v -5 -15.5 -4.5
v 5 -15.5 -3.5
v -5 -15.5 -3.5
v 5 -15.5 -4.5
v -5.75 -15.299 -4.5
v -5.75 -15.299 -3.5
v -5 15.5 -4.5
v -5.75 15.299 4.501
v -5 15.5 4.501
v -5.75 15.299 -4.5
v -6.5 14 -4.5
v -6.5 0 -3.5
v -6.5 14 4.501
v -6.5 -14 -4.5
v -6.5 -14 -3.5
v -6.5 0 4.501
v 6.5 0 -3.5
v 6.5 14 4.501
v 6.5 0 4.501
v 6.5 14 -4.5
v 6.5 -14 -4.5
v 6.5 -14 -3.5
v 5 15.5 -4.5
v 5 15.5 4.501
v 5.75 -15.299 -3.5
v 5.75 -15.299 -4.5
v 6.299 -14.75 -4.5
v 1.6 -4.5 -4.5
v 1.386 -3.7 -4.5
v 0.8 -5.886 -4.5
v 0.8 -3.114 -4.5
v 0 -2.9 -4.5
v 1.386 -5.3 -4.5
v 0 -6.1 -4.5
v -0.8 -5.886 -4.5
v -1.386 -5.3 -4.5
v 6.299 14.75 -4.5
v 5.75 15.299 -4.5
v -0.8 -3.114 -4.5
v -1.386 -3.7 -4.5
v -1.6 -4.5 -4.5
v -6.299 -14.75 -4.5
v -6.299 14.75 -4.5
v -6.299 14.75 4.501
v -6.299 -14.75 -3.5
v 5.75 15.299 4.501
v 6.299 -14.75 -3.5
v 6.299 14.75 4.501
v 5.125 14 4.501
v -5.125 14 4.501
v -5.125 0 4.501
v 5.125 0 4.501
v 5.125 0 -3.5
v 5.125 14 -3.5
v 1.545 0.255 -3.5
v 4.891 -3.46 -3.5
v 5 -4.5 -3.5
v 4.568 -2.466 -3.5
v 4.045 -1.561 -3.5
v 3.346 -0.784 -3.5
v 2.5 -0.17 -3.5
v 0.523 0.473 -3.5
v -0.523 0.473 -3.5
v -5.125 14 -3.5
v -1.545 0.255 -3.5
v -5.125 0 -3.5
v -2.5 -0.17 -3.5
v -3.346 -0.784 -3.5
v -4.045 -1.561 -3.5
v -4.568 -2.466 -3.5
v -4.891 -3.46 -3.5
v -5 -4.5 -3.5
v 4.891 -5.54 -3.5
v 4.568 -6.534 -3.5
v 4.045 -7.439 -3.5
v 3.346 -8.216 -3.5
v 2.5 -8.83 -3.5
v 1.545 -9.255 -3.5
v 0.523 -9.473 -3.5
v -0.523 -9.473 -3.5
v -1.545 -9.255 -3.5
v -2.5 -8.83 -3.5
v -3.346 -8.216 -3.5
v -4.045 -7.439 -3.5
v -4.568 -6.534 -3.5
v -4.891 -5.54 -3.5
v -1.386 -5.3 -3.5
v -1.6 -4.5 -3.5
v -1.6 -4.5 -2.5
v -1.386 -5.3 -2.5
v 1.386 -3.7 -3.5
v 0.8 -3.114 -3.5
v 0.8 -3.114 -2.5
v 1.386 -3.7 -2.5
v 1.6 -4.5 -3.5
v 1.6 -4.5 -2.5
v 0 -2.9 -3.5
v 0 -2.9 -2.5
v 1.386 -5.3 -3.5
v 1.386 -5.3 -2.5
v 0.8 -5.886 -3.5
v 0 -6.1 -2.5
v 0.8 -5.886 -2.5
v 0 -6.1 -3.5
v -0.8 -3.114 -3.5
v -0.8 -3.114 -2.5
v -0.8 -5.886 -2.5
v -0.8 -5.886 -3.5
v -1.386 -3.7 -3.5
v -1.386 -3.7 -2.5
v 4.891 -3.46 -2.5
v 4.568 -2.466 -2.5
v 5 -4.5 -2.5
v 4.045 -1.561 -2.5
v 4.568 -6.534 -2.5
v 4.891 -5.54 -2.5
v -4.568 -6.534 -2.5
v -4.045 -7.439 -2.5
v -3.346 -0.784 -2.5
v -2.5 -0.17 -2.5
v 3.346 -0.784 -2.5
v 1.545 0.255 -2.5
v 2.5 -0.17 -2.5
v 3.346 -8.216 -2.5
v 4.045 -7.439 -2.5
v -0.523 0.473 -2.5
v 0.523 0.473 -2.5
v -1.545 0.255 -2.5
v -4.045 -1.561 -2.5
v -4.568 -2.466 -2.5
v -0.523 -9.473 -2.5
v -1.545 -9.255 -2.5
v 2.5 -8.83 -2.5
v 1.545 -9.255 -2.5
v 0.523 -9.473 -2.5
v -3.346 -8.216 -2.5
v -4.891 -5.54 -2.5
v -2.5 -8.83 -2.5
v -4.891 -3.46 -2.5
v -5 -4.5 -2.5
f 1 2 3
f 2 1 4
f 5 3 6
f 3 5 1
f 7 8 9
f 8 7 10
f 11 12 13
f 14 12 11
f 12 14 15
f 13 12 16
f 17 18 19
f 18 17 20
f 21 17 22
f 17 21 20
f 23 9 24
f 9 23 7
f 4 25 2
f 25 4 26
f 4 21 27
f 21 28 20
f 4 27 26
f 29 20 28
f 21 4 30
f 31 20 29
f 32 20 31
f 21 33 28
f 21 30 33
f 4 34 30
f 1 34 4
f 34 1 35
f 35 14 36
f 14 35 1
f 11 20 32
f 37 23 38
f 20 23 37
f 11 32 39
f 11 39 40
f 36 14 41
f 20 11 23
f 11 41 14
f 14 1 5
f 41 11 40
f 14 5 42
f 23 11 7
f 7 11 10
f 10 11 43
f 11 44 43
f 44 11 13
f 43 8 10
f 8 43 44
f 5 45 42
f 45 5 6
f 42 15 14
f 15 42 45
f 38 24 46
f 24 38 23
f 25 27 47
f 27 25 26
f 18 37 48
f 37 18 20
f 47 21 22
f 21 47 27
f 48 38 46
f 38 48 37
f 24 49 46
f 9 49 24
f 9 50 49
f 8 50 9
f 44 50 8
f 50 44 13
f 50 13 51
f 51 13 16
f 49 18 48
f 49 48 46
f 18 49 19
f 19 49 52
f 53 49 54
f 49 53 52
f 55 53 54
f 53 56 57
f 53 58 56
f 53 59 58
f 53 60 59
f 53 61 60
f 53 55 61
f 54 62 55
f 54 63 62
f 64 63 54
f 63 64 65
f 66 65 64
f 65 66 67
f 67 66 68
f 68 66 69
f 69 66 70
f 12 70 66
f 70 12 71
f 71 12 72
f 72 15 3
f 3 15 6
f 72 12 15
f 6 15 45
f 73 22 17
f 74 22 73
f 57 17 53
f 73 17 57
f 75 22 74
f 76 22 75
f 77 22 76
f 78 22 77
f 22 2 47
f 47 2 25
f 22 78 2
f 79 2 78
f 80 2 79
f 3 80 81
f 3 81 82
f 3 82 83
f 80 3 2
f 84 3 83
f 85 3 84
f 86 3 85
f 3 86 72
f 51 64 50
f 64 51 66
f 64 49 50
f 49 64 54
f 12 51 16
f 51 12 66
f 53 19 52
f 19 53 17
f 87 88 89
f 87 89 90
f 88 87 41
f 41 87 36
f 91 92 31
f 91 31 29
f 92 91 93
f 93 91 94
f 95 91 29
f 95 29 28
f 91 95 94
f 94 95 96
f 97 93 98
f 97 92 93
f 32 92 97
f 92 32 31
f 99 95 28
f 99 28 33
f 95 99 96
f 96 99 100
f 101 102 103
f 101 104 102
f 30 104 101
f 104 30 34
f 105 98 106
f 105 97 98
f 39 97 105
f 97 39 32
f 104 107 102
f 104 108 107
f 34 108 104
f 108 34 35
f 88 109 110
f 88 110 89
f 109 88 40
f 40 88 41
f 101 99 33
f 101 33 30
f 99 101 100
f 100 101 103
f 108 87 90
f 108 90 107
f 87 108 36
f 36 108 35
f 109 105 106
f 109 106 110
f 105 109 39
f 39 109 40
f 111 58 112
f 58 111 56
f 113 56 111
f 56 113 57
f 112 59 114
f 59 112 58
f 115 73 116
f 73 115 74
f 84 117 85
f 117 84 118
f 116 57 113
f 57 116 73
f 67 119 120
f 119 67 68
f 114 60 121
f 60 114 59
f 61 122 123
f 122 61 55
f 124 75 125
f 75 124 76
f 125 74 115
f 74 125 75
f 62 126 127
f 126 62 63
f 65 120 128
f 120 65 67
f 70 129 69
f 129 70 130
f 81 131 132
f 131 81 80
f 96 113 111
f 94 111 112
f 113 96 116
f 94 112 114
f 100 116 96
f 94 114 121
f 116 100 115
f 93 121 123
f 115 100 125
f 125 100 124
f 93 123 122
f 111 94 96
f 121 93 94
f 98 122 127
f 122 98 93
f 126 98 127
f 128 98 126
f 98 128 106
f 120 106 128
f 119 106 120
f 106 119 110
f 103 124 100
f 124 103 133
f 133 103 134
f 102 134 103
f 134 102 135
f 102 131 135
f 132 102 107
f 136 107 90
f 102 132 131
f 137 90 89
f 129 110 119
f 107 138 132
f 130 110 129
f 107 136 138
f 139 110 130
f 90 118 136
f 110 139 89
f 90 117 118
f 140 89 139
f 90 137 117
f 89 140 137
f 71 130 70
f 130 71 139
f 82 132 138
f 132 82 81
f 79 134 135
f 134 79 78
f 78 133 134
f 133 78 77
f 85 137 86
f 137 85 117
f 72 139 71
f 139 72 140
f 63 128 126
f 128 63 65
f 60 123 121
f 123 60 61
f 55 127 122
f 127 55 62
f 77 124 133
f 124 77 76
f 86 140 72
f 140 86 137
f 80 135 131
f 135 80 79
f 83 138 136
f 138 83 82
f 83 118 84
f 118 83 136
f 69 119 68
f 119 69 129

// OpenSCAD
difference(){
minkowski(){
cube([10,28,9],center=true);
cylinder(d=3,h=0.001,$fn=12);
}
translate([0,-1,1])cube([10.25,30,9],center=true);
translate([0,-15,1])cube([15,30,9],center=true);
translate([0,-4.5,0])
    cylinder(d=3.2,h=20,center=true,$fn=12);
}

difference()
{
translate([0,-4.5,-4.5])cylinder(d=10,h=2,$fn=30);
translate([0,-4.5,-4.5])cylinder(d=3.2,h=2,$fn=12);
}
